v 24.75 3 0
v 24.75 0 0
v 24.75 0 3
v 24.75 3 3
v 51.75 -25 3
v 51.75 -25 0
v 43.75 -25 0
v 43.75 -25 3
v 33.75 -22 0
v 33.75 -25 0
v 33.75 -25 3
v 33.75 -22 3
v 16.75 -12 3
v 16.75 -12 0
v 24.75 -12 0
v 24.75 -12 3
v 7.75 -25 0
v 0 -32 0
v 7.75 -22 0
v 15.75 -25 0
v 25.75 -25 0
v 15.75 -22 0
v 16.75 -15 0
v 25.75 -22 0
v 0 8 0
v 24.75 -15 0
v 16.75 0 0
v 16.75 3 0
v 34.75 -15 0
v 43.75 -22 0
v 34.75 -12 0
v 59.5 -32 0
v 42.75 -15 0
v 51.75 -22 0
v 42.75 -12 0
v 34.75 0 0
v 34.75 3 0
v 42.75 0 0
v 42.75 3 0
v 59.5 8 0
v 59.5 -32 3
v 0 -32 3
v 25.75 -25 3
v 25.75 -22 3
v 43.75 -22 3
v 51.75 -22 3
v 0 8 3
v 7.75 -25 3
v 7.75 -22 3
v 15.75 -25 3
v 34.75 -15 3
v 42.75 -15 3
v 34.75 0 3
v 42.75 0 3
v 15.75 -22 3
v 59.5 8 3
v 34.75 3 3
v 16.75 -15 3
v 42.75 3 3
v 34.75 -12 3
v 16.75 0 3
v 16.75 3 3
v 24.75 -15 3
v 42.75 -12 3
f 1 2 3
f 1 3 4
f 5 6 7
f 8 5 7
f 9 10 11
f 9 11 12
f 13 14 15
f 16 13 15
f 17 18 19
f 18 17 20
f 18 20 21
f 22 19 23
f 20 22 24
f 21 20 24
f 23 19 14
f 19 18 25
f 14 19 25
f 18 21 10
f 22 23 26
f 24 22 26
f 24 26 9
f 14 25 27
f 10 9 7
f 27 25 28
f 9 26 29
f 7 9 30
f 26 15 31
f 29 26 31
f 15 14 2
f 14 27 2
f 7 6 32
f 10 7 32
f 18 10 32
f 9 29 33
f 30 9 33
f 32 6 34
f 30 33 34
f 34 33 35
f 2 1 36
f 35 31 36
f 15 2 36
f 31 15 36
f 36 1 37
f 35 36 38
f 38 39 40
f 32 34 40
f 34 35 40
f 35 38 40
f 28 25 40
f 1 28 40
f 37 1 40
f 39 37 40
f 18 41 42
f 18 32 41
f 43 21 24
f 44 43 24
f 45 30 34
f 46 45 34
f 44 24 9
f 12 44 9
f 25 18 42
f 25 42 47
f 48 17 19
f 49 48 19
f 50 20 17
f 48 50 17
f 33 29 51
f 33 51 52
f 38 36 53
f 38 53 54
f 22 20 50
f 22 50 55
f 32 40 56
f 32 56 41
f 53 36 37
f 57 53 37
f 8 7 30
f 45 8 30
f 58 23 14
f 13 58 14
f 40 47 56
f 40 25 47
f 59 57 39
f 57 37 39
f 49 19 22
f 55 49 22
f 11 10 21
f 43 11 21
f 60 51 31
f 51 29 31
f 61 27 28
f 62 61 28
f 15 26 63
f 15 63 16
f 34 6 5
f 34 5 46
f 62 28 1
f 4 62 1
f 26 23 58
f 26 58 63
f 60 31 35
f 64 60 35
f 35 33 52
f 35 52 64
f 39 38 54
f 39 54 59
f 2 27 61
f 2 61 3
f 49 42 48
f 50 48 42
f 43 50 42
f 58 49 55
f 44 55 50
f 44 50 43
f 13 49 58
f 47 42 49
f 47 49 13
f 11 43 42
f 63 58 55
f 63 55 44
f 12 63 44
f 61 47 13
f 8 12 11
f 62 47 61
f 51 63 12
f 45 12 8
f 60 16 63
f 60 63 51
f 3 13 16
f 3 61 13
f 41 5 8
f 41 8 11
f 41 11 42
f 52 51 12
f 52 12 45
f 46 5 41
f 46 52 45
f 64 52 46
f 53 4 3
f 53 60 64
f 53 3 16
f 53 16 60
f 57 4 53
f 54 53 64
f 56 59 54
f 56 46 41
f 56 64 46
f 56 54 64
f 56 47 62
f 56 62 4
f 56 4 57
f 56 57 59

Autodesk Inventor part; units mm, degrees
ref_plane "YZ Plane" through (0, 0, 0) normal (1, 0, 0) x (0, 1, 0)
ref_plane "XZ Plane" through (0, 0, 0) normal (0, 1, 0) x (-1, 0, 0)
ref_plane "XY Plane" through (0, 0, 0) normal (0, 0, 1) x (1, 0, 0)
sketch "Sketch1" plane through (0, 0, 0) normal (0, 0, 1) x (1, 0, 0)
  line L0 (0, 8) -> (59.5, 8)
  line L1 (59.5, 8) -> (59.5, -32)
  line L2 (59.5, -32) -> (0, -32)
  line L3 (0, -32) -> (0, 8)
  line L4 (0, 0) -> (0, 3) construction
  line L5 (59.5, 0) -> (59.5, 3) construction
  line L6 (0, 3) -> (16.75, 3) construction
  line L7 (15.75, -25) -> (7.75, -25) projected
  line L8 (15.75, -25) -> (15.75, -22) projected
  line L9 (7.75, -22) -> (15.75, -22) projected
  line L10 (7.75, -25) -> (7.75, -22) projected
  line L11 (33.75, -25) -> (25.75, -25) projected
  line L12 (33.75, -25) -> (33.75, -22) projected
  line L13 (25.75, -22) -> (33.75, -22) projected
  line L14 (25.75, -25) -> (25.75, -22) projected
  line L15 (51.75, -25) -> (43.75, -25) projected
  line L16 (51.75, -25) -> (51.75, -22) projected
  line L17 (43.75, -22) -> (51.75, -22) projected
  line L18 (43.75, -25) -> (43.75, -22) projected
  line L19 (16.75, -15) -> (24.75, -15) projected
  line L20 (24.75, -15) -> (24.75, -12) projected
  line L21 (16.75, -12) -> (24.75, -12) projected
  line L22 (16.75, -15) -> (16.75, -12) projected
  line L23 (34.75, -15) -> (42.75, -15) projected
  line L24 (42.75, -15) -> (42.75, -12) projected
  line L25 (34.75, -12) -> (42.75, -12) projected
  line L26 (34.75, -15) -> (34.75, -12) projected
  line L27 (16.75, 0) -> (24.75, 0) projected
  line L28 (24.75, 0) -> (24.75, 3) projected
  line L29 (16.75, 3) -> (24.75, 3) projected
  line L30 (16.75, 0) -> (16.75, 3) projected
  line L31 (34.75, 0) -> (42.75, 0) projected
  line L32 (42.75, 0) -> (42.75, 3) projected
  line L33 (34.75, 3) -> (42.75, 3) projected
  line L34 (34.75, 0) -> (34.75, 3) projected
  dimension "d0" = 40
  dimension "d1" = 5
extrude "Extrusion1" add sketch "Sketch1" along normal blind 3
properties part number "Side" material "Polycarbonate, Clear"
